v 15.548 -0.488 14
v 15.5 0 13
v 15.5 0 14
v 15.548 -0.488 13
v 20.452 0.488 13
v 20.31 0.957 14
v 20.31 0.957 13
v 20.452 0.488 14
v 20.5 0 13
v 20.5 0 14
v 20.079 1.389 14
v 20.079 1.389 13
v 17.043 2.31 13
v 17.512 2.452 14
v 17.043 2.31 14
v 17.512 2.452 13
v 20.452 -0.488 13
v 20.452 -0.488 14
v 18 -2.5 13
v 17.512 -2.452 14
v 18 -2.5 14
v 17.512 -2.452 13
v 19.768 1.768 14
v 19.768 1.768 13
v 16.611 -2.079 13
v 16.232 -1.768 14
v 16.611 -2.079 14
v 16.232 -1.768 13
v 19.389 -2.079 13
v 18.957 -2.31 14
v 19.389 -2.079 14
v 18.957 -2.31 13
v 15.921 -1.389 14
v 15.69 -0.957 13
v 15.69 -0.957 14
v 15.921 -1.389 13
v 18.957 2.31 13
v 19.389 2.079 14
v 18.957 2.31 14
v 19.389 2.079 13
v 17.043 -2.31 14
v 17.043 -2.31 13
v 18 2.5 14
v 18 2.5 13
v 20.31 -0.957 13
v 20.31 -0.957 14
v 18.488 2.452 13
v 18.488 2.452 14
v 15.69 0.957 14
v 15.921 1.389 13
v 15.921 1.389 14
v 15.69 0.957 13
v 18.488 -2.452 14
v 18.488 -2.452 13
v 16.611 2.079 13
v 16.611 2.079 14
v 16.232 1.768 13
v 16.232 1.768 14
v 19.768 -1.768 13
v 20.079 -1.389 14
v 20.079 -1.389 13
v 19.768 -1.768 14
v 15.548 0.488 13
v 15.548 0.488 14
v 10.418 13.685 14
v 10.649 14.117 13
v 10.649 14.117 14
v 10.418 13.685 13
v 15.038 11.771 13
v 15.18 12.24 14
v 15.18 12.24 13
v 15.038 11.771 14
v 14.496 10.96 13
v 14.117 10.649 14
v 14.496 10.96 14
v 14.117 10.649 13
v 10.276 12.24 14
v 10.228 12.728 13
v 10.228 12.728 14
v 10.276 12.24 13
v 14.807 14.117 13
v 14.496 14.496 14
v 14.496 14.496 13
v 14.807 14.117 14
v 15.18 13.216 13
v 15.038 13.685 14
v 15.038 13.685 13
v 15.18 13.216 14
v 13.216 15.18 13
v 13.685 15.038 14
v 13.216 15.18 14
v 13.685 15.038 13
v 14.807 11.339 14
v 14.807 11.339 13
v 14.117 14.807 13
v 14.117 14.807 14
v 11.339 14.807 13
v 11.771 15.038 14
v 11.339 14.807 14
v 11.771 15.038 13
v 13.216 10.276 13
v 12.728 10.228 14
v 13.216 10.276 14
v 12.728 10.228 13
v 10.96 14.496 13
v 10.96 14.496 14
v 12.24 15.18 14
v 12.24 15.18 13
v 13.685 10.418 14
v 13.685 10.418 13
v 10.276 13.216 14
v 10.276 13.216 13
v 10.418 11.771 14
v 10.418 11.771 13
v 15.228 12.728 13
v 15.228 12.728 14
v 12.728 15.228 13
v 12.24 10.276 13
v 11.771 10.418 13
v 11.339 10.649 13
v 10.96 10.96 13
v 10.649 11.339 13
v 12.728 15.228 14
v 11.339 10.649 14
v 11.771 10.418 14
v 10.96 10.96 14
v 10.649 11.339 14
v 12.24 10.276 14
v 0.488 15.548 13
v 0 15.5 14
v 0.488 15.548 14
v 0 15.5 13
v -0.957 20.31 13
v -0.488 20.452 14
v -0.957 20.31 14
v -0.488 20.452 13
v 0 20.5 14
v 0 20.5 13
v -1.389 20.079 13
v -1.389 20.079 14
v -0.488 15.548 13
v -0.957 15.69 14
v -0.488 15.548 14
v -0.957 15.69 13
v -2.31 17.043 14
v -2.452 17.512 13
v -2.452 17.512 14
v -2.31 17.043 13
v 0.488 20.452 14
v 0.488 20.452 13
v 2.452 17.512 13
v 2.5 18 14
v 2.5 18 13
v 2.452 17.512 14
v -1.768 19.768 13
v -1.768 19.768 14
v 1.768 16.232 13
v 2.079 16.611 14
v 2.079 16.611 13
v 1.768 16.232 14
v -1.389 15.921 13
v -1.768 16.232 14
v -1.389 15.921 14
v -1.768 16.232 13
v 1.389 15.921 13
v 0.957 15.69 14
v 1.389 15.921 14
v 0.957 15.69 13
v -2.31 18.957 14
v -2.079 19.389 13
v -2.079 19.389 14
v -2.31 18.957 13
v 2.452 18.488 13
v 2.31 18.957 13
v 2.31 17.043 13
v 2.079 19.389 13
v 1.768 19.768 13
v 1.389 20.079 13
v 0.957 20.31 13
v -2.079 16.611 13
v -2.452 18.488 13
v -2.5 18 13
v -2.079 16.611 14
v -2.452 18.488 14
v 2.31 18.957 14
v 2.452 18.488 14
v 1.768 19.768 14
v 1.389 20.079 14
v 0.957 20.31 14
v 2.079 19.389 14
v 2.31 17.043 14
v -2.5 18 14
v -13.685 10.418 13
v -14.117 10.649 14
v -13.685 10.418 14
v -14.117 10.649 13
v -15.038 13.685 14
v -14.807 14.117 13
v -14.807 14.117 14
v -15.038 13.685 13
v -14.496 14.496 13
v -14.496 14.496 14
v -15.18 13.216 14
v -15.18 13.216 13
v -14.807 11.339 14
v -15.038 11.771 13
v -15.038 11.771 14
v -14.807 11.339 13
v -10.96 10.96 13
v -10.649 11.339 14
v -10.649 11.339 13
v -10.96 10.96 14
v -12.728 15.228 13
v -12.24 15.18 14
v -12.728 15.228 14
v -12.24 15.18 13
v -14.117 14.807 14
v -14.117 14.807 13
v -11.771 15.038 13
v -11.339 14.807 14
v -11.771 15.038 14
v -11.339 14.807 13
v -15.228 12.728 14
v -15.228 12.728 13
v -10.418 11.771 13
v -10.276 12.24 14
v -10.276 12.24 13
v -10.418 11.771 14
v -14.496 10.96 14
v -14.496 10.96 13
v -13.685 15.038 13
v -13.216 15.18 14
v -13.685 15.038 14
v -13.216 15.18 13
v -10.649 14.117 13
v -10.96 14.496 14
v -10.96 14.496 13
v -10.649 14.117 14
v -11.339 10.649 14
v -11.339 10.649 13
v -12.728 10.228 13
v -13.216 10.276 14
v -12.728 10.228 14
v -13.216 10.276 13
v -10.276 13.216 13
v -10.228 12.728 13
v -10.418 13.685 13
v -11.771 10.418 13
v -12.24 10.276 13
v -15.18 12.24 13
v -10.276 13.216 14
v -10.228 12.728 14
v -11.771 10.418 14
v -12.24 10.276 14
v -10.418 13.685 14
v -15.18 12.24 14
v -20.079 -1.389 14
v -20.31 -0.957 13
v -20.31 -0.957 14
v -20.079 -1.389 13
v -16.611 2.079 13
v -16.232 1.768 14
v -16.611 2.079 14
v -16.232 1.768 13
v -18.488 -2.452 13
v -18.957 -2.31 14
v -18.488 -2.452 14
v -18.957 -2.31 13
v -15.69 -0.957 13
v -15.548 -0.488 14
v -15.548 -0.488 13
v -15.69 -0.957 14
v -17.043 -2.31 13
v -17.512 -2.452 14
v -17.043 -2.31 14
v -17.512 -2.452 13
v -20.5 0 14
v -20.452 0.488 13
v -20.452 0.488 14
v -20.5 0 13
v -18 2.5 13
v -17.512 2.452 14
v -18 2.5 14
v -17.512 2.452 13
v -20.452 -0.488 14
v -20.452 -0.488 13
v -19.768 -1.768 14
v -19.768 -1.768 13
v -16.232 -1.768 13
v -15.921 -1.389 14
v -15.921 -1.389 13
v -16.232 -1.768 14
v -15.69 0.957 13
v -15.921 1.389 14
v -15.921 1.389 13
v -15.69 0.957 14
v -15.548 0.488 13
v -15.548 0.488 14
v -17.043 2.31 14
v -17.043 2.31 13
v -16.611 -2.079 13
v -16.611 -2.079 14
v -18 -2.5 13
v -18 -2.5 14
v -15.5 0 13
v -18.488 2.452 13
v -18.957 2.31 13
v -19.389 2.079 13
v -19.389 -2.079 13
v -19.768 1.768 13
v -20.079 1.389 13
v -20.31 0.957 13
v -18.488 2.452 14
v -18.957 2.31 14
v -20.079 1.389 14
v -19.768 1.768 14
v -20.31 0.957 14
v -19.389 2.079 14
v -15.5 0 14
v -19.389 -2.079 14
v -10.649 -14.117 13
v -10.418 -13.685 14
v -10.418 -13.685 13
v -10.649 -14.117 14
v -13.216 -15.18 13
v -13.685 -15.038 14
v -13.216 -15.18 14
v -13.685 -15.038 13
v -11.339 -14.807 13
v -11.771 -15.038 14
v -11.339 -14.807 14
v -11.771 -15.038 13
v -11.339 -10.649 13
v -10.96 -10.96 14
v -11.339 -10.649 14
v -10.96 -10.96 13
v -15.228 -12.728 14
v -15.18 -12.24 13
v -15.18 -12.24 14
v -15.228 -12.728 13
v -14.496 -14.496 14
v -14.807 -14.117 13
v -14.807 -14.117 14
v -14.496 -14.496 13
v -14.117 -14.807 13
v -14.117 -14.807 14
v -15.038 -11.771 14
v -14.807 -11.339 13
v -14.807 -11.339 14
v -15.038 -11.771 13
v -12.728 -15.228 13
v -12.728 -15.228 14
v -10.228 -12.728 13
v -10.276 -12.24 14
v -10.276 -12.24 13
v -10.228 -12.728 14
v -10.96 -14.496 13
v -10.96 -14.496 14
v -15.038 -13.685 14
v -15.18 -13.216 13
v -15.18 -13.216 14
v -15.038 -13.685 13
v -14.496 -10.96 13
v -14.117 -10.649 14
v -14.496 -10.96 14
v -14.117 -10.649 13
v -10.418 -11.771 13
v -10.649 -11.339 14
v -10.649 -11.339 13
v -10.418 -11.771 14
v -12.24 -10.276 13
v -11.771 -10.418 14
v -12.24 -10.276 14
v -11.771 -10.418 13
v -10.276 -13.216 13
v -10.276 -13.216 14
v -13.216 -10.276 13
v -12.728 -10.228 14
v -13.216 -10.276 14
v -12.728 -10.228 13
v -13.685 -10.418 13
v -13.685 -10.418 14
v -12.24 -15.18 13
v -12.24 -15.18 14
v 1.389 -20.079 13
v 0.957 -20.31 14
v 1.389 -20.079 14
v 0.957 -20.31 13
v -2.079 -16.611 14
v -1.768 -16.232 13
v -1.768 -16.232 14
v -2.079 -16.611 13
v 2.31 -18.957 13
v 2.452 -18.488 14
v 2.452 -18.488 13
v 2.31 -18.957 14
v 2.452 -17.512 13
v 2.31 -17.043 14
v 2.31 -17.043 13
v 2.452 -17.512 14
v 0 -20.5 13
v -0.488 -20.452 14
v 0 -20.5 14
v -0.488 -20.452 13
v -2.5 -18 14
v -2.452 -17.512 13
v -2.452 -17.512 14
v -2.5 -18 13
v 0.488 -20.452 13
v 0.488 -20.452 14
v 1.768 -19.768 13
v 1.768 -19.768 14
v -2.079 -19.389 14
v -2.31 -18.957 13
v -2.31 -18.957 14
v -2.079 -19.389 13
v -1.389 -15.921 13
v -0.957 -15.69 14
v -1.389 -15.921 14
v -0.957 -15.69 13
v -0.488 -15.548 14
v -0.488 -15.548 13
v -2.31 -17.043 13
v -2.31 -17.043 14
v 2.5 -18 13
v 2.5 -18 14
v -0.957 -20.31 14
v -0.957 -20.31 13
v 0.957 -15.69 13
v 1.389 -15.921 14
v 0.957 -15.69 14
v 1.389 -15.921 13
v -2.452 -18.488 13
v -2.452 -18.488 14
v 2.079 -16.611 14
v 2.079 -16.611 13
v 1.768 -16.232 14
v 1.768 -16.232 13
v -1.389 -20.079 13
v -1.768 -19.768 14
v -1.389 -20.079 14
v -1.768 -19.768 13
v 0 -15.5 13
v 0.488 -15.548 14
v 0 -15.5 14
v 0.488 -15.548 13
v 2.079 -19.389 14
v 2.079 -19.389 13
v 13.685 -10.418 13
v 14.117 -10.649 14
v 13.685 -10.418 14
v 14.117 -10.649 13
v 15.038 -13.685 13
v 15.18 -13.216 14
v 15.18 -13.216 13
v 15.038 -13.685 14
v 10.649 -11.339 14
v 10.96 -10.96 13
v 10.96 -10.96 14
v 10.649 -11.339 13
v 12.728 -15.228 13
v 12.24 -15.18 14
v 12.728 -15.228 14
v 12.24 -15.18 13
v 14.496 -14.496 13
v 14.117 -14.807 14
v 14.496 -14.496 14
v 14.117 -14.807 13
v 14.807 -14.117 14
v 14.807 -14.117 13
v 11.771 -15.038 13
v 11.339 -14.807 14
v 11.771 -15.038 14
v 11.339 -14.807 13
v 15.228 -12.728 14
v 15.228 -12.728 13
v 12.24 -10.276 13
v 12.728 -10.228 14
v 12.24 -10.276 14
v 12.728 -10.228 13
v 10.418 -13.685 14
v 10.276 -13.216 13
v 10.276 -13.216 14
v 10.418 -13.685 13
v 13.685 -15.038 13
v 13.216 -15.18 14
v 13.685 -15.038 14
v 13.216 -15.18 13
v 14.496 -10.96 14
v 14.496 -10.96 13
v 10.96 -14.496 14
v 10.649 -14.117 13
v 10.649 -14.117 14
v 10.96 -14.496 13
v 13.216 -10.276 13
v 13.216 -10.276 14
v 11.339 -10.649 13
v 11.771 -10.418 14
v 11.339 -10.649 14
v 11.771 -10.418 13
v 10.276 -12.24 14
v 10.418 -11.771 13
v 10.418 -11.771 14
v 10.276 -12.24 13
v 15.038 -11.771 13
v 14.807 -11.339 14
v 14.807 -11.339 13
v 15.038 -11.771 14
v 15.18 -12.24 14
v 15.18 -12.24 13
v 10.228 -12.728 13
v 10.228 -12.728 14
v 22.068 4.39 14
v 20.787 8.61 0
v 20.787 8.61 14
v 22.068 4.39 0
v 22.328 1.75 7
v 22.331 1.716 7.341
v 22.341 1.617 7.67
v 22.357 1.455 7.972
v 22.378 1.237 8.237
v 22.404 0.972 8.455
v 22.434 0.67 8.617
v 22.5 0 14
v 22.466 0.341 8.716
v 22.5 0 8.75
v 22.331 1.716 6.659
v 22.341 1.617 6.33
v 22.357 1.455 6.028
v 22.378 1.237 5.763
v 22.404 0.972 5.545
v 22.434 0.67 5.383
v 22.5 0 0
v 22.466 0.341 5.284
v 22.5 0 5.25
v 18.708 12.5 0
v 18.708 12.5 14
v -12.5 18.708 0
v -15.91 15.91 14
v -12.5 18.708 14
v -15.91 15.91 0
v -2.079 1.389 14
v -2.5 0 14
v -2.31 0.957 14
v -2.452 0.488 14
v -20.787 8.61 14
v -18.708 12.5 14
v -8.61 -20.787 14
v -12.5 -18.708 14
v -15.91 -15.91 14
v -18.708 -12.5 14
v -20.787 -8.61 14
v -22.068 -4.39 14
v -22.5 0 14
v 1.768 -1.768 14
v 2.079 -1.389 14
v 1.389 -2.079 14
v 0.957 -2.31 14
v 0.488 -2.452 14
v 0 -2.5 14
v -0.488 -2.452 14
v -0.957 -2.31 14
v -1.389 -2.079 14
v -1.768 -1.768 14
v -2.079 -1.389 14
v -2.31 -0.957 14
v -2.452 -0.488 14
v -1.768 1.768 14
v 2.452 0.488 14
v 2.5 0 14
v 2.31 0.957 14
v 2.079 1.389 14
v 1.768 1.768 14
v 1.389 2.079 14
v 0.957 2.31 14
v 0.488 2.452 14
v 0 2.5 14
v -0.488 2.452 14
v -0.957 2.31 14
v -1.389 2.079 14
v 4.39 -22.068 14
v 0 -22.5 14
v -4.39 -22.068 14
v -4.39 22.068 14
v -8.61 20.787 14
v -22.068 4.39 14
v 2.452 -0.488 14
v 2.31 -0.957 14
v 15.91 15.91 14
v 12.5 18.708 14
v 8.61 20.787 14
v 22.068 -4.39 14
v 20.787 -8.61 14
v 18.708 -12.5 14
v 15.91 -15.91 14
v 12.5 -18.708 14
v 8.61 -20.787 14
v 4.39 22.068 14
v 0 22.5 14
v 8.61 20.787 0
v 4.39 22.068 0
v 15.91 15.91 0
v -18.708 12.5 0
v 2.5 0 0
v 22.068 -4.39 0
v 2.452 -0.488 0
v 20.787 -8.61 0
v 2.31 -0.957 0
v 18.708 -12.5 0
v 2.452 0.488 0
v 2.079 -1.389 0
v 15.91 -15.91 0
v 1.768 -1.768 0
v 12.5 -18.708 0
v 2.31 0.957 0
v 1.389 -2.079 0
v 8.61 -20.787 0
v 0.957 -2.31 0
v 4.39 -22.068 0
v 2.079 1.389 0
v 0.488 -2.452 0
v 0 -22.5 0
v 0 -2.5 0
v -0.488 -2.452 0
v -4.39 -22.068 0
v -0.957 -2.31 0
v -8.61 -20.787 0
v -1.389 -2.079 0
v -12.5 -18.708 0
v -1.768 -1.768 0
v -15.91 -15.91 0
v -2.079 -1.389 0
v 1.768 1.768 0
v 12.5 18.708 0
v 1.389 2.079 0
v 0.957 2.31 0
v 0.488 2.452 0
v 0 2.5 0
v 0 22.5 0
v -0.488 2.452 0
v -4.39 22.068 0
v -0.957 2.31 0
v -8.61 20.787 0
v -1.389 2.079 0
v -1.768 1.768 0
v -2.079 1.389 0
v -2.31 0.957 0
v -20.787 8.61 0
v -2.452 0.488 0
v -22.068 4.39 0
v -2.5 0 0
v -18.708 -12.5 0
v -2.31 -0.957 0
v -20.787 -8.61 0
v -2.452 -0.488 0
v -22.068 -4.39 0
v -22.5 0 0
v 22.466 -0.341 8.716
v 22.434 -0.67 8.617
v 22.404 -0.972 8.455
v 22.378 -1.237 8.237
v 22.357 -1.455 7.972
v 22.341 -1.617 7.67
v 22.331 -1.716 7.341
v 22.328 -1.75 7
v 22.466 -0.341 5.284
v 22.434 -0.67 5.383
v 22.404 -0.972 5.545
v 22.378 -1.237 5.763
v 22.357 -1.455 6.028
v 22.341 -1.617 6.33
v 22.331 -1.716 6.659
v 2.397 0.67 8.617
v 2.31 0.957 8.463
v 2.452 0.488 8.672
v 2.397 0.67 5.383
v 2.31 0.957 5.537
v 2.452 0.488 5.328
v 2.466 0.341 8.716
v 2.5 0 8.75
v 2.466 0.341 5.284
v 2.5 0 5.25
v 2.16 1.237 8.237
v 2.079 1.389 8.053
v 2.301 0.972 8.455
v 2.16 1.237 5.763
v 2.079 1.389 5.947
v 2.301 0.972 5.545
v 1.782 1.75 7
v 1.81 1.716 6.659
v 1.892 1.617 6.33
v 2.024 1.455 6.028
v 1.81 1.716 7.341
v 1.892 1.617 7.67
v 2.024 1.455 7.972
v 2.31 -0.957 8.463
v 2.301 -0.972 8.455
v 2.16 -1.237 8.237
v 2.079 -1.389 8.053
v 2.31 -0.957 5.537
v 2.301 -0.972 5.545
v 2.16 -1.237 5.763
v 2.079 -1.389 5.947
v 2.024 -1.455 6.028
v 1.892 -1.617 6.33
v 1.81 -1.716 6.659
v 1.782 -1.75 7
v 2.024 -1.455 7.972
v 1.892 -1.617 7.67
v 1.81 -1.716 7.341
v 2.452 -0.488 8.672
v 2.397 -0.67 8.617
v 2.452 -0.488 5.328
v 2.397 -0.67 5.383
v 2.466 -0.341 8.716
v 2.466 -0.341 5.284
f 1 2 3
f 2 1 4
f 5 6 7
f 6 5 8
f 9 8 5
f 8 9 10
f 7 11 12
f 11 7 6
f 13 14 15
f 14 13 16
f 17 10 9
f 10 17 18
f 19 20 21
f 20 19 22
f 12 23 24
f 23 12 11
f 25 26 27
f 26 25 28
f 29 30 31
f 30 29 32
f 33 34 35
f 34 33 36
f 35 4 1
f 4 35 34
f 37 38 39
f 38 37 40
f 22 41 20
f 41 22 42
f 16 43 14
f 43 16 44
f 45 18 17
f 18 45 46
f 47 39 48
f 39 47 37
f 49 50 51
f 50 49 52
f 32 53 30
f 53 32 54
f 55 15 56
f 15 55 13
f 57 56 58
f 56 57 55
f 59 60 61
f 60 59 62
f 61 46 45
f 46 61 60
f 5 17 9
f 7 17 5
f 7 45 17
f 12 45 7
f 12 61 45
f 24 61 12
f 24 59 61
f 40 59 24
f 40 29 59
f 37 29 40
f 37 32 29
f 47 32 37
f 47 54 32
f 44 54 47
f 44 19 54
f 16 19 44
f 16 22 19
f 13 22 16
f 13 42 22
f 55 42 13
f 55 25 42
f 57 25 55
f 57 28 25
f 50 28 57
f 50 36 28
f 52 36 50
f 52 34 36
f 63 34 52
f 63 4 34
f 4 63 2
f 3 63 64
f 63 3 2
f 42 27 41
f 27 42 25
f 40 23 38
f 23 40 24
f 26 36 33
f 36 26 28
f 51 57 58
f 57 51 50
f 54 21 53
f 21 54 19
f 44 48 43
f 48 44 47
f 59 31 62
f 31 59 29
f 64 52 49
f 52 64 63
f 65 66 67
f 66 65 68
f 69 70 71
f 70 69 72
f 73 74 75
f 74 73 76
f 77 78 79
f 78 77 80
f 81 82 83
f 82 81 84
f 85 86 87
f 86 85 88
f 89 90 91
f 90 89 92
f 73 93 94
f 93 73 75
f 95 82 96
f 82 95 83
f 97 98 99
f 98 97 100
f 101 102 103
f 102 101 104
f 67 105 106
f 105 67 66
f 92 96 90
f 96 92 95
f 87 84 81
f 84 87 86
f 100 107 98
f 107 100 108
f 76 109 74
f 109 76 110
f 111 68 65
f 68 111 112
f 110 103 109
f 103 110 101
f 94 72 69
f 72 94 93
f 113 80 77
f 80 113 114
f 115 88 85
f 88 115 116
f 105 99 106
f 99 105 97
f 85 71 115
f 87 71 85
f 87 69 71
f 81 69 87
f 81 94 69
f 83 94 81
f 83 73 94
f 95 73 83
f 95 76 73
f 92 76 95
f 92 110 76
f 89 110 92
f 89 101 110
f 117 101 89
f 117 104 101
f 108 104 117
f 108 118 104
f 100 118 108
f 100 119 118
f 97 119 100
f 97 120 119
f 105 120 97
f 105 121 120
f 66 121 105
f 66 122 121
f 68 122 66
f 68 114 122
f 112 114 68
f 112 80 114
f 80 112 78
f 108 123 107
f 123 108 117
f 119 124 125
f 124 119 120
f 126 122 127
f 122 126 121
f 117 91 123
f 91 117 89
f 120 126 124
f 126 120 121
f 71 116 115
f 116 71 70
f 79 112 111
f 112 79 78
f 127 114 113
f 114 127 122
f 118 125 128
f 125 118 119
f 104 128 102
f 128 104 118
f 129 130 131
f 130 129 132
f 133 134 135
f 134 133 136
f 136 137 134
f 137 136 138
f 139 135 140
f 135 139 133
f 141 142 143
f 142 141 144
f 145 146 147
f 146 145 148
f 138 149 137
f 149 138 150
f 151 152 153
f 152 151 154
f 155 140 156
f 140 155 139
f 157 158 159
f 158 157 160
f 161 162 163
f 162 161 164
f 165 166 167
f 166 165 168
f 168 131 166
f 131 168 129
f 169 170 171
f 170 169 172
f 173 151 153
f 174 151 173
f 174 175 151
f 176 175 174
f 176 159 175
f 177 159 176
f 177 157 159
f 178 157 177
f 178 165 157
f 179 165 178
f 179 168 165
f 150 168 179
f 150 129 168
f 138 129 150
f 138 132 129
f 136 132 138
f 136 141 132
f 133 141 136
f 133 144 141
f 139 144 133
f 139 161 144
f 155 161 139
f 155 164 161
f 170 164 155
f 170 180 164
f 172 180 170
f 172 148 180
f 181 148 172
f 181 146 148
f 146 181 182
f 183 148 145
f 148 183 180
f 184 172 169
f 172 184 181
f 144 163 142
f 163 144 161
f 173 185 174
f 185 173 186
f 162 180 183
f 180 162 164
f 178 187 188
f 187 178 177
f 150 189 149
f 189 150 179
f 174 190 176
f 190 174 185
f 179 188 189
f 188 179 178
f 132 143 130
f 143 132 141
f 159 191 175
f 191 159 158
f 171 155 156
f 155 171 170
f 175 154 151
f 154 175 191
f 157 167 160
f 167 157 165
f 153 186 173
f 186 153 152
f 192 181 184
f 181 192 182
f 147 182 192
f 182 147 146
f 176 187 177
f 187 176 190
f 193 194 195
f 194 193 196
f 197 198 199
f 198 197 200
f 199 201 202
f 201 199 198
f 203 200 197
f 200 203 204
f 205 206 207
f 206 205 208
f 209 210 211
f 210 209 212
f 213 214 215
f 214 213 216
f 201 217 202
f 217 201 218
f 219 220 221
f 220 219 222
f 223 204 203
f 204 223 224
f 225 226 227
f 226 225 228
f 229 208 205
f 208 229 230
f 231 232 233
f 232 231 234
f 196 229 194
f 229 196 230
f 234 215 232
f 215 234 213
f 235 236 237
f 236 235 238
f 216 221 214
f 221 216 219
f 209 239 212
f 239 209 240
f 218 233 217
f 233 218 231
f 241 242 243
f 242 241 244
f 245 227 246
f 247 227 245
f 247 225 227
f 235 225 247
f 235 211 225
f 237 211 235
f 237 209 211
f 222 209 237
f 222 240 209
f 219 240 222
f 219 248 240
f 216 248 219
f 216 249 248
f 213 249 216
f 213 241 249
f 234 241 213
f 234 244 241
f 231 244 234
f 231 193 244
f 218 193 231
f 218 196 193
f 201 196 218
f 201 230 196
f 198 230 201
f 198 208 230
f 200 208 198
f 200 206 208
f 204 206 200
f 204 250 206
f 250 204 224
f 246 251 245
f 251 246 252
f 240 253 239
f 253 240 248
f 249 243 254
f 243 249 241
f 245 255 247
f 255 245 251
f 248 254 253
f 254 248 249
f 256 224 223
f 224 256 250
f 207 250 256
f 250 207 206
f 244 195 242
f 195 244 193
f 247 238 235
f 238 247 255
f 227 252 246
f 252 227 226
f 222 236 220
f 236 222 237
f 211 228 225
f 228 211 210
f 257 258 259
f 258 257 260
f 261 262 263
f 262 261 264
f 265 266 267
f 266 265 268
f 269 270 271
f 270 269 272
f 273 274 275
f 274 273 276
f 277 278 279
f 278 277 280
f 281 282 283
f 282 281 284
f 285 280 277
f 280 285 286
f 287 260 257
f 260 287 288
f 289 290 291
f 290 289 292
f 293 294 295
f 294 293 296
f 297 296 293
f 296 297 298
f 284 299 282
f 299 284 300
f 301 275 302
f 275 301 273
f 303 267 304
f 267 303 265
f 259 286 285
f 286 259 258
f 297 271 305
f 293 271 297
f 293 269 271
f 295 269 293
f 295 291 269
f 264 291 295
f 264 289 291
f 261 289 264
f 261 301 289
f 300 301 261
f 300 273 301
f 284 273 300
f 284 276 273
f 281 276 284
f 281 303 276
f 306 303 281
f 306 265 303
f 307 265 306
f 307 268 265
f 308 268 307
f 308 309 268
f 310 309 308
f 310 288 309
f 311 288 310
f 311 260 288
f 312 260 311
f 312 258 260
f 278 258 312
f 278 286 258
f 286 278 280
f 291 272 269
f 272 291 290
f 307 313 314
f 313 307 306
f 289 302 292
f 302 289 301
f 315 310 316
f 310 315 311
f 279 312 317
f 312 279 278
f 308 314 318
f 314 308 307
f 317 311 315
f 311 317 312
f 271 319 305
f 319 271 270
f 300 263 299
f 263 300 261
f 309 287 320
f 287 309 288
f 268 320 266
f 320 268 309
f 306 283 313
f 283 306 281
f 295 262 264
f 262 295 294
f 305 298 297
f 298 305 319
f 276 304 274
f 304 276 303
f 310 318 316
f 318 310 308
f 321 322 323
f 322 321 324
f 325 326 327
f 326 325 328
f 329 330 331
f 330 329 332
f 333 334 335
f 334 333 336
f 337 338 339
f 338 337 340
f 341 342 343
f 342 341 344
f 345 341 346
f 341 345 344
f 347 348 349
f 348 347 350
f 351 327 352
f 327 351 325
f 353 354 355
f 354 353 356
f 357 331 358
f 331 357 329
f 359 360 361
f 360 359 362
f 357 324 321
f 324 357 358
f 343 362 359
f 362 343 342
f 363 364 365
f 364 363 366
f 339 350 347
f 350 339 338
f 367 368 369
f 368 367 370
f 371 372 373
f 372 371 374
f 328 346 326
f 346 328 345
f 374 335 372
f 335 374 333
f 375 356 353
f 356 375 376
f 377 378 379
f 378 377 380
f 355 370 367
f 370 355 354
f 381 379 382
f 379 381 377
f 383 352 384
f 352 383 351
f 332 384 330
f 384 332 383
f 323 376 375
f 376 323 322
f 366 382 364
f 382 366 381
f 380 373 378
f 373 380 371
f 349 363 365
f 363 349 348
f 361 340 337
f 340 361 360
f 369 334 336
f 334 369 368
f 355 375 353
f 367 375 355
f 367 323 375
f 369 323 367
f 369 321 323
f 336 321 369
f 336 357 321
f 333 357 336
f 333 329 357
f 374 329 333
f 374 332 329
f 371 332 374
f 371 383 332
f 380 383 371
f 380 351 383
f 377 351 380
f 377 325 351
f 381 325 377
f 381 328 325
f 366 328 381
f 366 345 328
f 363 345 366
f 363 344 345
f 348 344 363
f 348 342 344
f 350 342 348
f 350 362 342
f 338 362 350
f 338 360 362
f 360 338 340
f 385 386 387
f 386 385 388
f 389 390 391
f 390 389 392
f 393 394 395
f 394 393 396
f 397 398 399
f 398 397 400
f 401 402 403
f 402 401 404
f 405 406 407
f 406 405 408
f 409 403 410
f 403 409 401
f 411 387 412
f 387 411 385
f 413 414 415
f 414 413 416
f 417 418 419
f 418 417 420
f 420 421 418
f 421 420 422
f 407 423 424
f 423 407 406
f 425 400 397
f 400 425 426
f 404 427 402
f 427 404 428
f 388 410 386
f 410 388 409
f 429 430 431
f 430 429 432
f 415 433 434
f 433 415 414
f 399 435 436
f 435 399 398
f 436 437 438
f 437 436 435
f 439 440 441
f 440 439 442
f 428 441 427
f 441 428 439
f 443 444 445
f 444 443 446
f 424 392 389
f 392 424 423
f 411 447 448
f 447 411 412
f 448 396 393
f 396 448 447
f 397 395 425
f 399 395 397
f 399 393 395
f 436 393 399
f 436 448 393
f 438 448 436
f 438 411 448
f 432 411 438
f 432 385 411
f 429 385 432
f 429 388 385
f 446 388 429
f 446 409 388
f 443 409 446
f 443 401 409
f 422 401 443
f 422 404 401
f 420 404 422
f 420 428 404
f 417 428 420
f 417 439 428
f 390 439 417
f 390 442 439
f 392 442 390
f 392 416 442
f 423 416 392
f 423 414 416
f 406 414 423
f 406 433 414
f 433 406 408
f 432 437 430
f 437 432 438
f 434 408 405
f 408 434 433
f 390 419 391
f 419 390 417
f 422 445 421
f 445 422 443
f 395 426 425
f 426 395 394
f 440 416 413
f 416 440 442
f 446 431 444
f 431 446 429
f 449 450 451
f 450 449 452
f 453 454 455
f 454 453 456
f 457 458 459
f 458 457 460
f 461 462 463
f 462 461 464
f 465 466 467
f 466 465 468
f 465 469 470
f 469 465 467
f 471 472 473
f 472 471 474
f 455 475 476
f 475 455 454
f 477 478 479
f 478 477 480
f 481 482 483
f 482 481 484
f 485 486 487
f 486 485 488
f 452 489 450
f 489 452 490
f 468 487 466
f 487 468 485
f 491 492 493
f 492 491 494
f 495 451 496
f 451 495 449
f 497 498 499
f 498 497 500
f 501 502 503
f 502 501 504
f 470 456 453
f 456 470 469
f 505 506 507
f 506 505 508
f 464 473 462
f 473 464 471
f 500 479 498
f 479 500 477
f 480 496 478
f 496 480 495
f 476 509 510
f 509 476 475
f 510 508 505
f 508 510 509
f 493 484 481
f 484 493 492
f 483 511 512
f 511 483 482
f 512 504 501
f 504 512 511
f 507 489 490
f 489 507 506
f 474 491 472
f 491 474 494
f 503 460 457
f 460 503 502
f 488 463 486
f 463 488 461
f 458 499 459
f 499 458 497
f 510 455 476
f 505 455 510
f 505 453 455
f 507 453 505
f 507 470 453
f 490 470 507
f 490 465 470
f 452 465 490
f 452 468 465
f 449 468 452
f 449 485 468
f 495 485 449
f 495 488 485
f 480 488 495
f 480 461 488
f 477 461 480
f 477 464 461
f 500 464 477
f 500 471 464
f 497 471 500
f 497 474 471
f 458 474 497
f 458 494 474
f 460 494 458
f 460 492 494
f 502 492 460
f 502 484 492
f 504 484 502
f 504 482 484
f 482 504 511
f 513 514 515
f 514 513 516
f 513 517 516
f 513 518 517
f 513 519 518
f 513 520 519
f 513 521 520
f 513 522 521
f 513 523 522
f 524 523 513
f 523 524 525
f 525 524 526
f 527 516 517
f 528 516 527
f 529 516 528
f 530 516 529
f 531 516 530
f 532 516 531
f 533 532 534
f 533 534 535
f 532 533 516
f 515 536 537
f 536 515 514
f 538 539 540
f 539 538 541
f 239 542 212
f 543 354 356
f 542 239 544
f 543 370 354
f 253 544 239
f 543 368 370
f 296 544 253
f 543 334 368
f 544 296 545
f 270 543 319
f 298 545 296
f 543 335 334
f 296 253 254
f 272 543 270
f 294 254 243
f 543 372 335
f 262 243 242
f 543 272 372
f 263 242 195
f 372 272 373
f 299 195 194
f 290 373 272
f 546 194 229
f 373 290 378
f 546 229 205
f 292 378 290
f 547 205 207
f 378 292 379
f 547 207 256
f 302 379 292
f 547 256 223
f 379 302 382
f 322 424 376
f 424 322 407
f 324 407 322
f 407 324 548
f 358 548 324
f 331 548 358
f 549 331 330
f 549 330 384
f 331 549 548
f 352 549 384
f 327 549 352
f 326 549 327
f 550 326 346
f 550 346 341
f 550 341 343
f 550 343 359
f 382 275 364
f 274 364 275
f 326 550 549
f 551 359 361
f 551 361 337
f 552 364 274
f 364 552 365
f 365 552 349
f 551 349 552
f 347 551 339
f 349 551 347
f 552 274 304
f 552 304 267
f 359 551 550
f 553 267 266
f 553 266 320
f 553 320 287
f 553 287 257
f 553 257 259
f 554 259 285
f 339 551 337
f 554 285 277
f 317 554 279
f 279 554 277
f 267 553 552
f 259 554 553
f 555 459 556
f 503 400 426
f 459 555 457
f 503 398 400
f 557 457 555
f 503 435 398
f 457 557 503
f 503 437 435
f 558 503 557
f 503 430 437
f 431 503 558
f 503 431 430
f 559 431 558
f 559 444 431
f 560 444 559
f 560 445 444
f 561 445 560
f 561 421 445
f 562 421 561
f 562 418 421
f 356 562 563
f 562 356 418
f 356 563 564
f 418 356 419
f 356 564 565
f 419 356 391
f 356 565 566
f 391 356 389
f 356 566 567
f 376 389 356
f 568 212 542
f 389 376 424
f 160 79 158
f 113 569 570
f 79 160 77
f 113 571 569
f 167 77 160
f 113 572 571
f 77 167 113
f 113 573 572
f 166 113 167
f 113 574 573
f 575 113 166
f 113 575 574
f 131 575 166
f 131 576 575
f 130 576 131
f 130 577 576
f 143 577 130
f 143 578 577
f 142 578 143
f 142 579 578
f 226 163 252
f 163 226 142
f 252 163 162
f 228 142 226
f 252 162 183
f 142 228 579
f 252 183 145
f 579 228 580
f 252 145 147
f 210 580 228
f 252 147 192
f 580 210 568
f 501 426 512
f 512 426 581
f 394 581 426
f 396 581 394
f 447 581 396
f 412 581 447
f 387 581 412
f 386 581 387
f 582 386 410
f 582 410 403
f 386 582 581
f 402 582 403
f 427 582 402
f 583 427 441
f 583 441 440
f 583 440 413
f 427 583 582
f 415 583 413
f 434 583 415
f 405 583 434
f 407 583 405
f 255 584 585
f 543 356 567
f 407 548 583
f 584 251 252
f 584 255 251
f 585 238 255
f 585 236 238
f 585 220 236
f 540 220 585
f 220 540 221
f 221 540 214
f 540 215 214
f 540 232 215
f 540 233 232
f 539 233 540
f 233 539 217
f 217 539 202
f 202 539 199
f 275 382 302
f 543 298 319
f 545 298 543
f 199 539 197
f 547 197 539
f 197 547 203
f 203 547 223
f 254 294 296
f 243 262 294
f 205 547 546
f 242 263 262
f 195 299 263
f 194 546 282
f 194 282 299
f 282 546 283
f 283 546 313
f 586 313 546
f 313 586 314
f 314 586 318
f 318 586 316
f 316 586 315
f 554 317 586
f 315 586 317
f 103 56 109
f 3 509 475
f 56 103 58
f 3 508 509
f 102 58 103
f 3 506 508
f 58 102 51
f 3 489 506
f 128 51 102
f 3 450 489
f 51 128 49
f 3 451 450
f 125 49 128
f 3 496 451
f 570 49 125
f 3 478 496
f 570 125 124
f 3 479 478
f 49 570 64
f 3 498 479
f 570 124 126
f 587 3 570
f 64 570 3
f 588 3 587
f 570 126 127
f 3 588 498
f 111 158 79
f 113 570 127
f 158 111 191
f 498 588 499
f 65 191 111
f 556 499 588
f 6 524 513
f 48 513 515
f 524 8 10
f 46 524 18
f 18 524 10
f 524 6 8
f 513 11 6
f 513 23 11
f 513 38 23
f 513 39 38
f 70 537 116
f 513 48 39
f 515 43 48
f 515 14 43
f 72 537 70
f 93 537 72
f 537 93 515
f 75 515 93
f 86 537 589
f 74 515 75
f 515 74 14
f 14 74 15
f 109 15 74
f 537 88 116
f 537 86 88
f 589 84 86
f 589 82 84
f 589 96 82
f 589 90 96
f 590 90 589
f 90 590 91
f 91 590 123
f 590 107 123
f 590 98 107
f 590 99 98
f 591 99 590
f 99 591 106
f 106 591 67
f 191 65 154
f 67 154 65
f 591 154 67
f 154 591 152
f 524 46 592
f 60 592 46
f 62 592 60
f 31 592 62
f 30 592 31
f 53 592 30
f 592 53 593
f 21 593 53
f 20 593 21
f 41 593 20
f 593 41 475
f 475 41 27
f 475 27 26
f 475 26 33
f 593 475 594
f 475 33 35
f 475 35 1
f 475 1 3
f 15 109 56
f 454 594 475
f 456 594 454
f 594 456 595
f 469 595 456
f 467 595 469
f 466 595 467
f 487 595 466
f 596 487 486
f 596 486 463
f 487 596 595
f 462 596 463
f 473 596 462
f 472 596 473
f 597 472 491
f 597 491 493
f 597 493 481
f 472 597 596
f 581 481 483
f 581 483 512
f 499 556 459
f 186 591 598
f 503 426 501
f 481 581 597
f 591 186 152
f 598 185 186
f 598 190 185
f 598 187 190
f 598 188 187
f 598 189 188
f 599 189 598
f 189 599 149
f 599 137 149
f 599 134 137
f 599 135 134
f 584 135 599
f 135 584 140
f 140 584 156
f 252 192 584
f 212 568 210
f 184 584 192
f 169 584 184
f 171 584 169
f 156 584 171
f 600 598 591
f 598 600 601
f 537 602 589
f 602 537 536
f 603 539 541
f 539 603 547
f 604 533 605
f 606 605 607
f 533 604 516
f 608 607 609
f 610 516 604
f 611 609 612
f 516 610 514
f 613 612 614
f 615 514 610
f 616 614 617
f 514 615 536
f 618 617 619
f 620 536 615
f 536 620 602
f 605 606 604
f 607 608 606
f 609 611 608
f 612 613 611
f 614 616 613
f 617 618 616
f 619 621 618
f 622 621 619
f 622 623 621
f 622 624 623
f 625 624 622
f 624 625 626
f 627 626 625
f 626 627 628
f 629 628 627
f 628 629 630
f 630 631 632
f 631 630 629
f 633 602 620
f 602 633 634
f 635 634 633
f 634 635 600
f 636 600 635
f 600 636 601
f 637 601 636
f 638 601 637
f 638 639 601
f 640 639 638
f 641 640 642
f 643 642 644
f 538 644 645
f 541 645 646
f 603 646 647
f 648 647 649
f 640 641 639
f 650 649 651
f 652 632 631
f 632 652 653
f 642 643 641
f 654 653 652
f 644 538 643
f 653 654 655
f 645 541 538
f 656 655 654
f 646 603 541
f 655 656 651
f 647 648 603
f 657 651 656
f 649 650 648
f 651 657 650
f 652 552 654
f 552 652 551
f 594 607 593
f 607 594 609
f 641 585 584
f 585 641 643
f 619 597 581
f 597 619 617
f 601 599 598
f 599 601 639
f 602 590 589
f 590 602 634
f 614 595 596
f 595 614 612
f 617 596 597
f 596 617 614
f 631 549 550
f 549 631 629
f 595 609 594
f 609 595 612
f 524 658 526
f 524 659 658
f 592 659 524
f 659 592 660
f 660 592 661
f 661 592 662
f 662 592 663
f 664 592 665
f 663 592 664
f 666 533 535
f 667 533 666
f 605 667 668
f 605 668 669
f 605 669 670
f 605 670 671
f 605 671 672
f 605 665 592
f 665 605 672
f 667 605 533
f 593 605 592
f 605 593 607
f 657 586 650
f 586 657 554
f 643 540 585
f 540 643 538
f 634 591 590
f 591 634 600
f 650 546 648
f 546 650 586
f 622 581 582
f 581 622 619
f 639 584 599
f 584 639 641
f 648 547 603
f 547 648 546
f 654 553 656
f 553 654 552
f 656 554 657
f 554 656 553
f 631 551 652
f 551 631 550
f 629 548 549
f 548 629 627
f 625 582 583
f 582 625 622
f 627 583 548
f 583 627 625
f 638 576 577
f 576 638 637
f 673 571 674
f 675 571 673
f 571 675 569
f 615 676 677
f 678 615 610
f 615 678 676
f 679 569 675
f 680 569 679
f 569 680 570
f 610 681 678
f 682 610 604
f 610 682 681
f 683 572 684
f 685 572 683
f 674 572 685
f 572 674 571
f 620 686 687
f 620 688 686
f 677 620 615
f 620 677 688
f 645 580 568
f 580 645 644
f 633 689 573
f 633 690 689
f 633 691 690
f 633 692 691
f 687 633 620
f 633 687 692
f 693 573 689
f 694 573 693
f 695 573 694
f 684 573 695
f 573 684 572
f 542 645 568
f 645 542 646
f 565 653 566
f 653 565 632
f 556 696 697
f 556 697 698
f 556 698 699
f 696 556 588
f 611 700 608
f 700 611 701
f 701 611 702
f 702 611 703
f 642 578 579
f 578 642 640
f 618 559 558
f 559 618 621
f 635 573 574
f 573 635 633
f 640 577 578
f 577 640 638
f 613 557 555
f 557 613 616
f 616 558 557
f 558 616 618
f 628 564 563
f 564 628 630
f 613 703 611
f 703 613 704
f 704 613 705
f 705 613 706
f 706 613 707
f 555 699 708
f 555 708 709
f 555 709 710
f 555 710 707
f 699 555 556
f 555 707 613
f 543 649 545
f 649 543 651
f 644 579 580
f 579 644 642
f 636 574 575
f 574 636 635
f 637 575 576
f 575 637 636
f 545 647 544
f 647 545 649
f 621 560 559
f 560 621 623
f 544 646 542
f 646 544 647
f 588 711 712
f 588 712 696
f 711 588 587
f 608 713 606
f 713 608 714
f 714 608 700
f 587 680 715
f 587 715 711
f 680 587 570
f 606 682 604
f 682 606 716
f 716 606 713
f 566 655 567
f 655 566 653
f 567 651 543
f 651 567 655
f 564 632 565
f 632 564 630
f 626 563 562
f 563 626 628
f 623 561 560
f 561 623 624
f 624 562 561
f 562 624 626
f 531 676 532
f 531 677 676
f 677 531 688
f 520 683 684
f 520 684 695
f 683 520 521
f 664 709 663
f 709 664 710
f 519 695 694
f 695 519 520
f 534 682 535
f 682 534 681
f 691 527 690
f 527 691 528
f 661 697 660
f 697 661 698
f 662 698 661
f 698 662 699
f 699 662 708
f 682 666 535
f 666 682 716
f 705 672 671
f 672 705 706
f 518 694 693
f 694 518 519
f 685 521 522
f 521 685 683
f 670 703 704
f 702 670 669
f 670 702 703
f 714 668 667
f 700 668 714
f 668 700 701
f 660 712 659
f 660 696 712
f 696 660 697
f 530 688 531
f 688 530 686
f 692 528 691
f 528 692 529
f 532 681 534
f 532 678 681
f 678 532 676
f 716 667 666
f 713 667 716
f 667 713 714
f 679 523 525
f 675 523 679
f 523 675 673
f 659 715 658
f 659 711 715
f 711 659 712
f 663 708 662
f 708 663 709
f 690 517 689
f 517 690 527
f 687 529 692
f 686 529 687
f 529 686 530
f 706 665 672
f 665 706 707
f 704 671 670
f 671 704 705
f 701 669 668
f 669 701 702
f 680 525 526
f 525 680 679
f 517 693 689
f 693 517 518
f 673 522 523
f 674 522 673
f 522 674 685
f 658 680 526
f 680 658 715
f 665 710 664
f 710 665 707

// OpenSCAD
$fn = 32;

// ----------------------------------------------------------------------
// Control knob: dimpled knob
// ----------------------------------------------------------------------

// --- parameters (mm) ---
dimp_d = 5;               // finger dimple diameter
n_dimp = 8;               // number of dimples
dimp_r = 18;              // dimple ring radius
knob_d = 45;              // knob body diameter
knob_h = 14;              // knob body height
bore_d = 5;               // shaft bore diameter
set_d = 3.5;              // set screw bore diameter
fit_tol = 0.05;           // tolerance for press fits, mm
free_tol = 0.3;           // tolerance for clearance fits, mm

dimp_step = 360 / n_dimp;  // dimple angular step

difference() {
  cylinder(h = knob_h, d = knob_d);
  translate([0, 0, -1]) cylinder(h = knob_h + 2, d = bore_d);
  translate([-1, 0, knob_h / 2]) rotate([0, 90, 0])
    cylinder(h = knob_d / 2 + bore_d / 2 + 2, d = set_d);  for (i = [0 : n_dimp - 1])
    rotate([0, 0, i * dimp_step])
      translate([dimp_r, 0, knob_h - 1])
        cylinder(h = 2, d = dimp_d);
}
